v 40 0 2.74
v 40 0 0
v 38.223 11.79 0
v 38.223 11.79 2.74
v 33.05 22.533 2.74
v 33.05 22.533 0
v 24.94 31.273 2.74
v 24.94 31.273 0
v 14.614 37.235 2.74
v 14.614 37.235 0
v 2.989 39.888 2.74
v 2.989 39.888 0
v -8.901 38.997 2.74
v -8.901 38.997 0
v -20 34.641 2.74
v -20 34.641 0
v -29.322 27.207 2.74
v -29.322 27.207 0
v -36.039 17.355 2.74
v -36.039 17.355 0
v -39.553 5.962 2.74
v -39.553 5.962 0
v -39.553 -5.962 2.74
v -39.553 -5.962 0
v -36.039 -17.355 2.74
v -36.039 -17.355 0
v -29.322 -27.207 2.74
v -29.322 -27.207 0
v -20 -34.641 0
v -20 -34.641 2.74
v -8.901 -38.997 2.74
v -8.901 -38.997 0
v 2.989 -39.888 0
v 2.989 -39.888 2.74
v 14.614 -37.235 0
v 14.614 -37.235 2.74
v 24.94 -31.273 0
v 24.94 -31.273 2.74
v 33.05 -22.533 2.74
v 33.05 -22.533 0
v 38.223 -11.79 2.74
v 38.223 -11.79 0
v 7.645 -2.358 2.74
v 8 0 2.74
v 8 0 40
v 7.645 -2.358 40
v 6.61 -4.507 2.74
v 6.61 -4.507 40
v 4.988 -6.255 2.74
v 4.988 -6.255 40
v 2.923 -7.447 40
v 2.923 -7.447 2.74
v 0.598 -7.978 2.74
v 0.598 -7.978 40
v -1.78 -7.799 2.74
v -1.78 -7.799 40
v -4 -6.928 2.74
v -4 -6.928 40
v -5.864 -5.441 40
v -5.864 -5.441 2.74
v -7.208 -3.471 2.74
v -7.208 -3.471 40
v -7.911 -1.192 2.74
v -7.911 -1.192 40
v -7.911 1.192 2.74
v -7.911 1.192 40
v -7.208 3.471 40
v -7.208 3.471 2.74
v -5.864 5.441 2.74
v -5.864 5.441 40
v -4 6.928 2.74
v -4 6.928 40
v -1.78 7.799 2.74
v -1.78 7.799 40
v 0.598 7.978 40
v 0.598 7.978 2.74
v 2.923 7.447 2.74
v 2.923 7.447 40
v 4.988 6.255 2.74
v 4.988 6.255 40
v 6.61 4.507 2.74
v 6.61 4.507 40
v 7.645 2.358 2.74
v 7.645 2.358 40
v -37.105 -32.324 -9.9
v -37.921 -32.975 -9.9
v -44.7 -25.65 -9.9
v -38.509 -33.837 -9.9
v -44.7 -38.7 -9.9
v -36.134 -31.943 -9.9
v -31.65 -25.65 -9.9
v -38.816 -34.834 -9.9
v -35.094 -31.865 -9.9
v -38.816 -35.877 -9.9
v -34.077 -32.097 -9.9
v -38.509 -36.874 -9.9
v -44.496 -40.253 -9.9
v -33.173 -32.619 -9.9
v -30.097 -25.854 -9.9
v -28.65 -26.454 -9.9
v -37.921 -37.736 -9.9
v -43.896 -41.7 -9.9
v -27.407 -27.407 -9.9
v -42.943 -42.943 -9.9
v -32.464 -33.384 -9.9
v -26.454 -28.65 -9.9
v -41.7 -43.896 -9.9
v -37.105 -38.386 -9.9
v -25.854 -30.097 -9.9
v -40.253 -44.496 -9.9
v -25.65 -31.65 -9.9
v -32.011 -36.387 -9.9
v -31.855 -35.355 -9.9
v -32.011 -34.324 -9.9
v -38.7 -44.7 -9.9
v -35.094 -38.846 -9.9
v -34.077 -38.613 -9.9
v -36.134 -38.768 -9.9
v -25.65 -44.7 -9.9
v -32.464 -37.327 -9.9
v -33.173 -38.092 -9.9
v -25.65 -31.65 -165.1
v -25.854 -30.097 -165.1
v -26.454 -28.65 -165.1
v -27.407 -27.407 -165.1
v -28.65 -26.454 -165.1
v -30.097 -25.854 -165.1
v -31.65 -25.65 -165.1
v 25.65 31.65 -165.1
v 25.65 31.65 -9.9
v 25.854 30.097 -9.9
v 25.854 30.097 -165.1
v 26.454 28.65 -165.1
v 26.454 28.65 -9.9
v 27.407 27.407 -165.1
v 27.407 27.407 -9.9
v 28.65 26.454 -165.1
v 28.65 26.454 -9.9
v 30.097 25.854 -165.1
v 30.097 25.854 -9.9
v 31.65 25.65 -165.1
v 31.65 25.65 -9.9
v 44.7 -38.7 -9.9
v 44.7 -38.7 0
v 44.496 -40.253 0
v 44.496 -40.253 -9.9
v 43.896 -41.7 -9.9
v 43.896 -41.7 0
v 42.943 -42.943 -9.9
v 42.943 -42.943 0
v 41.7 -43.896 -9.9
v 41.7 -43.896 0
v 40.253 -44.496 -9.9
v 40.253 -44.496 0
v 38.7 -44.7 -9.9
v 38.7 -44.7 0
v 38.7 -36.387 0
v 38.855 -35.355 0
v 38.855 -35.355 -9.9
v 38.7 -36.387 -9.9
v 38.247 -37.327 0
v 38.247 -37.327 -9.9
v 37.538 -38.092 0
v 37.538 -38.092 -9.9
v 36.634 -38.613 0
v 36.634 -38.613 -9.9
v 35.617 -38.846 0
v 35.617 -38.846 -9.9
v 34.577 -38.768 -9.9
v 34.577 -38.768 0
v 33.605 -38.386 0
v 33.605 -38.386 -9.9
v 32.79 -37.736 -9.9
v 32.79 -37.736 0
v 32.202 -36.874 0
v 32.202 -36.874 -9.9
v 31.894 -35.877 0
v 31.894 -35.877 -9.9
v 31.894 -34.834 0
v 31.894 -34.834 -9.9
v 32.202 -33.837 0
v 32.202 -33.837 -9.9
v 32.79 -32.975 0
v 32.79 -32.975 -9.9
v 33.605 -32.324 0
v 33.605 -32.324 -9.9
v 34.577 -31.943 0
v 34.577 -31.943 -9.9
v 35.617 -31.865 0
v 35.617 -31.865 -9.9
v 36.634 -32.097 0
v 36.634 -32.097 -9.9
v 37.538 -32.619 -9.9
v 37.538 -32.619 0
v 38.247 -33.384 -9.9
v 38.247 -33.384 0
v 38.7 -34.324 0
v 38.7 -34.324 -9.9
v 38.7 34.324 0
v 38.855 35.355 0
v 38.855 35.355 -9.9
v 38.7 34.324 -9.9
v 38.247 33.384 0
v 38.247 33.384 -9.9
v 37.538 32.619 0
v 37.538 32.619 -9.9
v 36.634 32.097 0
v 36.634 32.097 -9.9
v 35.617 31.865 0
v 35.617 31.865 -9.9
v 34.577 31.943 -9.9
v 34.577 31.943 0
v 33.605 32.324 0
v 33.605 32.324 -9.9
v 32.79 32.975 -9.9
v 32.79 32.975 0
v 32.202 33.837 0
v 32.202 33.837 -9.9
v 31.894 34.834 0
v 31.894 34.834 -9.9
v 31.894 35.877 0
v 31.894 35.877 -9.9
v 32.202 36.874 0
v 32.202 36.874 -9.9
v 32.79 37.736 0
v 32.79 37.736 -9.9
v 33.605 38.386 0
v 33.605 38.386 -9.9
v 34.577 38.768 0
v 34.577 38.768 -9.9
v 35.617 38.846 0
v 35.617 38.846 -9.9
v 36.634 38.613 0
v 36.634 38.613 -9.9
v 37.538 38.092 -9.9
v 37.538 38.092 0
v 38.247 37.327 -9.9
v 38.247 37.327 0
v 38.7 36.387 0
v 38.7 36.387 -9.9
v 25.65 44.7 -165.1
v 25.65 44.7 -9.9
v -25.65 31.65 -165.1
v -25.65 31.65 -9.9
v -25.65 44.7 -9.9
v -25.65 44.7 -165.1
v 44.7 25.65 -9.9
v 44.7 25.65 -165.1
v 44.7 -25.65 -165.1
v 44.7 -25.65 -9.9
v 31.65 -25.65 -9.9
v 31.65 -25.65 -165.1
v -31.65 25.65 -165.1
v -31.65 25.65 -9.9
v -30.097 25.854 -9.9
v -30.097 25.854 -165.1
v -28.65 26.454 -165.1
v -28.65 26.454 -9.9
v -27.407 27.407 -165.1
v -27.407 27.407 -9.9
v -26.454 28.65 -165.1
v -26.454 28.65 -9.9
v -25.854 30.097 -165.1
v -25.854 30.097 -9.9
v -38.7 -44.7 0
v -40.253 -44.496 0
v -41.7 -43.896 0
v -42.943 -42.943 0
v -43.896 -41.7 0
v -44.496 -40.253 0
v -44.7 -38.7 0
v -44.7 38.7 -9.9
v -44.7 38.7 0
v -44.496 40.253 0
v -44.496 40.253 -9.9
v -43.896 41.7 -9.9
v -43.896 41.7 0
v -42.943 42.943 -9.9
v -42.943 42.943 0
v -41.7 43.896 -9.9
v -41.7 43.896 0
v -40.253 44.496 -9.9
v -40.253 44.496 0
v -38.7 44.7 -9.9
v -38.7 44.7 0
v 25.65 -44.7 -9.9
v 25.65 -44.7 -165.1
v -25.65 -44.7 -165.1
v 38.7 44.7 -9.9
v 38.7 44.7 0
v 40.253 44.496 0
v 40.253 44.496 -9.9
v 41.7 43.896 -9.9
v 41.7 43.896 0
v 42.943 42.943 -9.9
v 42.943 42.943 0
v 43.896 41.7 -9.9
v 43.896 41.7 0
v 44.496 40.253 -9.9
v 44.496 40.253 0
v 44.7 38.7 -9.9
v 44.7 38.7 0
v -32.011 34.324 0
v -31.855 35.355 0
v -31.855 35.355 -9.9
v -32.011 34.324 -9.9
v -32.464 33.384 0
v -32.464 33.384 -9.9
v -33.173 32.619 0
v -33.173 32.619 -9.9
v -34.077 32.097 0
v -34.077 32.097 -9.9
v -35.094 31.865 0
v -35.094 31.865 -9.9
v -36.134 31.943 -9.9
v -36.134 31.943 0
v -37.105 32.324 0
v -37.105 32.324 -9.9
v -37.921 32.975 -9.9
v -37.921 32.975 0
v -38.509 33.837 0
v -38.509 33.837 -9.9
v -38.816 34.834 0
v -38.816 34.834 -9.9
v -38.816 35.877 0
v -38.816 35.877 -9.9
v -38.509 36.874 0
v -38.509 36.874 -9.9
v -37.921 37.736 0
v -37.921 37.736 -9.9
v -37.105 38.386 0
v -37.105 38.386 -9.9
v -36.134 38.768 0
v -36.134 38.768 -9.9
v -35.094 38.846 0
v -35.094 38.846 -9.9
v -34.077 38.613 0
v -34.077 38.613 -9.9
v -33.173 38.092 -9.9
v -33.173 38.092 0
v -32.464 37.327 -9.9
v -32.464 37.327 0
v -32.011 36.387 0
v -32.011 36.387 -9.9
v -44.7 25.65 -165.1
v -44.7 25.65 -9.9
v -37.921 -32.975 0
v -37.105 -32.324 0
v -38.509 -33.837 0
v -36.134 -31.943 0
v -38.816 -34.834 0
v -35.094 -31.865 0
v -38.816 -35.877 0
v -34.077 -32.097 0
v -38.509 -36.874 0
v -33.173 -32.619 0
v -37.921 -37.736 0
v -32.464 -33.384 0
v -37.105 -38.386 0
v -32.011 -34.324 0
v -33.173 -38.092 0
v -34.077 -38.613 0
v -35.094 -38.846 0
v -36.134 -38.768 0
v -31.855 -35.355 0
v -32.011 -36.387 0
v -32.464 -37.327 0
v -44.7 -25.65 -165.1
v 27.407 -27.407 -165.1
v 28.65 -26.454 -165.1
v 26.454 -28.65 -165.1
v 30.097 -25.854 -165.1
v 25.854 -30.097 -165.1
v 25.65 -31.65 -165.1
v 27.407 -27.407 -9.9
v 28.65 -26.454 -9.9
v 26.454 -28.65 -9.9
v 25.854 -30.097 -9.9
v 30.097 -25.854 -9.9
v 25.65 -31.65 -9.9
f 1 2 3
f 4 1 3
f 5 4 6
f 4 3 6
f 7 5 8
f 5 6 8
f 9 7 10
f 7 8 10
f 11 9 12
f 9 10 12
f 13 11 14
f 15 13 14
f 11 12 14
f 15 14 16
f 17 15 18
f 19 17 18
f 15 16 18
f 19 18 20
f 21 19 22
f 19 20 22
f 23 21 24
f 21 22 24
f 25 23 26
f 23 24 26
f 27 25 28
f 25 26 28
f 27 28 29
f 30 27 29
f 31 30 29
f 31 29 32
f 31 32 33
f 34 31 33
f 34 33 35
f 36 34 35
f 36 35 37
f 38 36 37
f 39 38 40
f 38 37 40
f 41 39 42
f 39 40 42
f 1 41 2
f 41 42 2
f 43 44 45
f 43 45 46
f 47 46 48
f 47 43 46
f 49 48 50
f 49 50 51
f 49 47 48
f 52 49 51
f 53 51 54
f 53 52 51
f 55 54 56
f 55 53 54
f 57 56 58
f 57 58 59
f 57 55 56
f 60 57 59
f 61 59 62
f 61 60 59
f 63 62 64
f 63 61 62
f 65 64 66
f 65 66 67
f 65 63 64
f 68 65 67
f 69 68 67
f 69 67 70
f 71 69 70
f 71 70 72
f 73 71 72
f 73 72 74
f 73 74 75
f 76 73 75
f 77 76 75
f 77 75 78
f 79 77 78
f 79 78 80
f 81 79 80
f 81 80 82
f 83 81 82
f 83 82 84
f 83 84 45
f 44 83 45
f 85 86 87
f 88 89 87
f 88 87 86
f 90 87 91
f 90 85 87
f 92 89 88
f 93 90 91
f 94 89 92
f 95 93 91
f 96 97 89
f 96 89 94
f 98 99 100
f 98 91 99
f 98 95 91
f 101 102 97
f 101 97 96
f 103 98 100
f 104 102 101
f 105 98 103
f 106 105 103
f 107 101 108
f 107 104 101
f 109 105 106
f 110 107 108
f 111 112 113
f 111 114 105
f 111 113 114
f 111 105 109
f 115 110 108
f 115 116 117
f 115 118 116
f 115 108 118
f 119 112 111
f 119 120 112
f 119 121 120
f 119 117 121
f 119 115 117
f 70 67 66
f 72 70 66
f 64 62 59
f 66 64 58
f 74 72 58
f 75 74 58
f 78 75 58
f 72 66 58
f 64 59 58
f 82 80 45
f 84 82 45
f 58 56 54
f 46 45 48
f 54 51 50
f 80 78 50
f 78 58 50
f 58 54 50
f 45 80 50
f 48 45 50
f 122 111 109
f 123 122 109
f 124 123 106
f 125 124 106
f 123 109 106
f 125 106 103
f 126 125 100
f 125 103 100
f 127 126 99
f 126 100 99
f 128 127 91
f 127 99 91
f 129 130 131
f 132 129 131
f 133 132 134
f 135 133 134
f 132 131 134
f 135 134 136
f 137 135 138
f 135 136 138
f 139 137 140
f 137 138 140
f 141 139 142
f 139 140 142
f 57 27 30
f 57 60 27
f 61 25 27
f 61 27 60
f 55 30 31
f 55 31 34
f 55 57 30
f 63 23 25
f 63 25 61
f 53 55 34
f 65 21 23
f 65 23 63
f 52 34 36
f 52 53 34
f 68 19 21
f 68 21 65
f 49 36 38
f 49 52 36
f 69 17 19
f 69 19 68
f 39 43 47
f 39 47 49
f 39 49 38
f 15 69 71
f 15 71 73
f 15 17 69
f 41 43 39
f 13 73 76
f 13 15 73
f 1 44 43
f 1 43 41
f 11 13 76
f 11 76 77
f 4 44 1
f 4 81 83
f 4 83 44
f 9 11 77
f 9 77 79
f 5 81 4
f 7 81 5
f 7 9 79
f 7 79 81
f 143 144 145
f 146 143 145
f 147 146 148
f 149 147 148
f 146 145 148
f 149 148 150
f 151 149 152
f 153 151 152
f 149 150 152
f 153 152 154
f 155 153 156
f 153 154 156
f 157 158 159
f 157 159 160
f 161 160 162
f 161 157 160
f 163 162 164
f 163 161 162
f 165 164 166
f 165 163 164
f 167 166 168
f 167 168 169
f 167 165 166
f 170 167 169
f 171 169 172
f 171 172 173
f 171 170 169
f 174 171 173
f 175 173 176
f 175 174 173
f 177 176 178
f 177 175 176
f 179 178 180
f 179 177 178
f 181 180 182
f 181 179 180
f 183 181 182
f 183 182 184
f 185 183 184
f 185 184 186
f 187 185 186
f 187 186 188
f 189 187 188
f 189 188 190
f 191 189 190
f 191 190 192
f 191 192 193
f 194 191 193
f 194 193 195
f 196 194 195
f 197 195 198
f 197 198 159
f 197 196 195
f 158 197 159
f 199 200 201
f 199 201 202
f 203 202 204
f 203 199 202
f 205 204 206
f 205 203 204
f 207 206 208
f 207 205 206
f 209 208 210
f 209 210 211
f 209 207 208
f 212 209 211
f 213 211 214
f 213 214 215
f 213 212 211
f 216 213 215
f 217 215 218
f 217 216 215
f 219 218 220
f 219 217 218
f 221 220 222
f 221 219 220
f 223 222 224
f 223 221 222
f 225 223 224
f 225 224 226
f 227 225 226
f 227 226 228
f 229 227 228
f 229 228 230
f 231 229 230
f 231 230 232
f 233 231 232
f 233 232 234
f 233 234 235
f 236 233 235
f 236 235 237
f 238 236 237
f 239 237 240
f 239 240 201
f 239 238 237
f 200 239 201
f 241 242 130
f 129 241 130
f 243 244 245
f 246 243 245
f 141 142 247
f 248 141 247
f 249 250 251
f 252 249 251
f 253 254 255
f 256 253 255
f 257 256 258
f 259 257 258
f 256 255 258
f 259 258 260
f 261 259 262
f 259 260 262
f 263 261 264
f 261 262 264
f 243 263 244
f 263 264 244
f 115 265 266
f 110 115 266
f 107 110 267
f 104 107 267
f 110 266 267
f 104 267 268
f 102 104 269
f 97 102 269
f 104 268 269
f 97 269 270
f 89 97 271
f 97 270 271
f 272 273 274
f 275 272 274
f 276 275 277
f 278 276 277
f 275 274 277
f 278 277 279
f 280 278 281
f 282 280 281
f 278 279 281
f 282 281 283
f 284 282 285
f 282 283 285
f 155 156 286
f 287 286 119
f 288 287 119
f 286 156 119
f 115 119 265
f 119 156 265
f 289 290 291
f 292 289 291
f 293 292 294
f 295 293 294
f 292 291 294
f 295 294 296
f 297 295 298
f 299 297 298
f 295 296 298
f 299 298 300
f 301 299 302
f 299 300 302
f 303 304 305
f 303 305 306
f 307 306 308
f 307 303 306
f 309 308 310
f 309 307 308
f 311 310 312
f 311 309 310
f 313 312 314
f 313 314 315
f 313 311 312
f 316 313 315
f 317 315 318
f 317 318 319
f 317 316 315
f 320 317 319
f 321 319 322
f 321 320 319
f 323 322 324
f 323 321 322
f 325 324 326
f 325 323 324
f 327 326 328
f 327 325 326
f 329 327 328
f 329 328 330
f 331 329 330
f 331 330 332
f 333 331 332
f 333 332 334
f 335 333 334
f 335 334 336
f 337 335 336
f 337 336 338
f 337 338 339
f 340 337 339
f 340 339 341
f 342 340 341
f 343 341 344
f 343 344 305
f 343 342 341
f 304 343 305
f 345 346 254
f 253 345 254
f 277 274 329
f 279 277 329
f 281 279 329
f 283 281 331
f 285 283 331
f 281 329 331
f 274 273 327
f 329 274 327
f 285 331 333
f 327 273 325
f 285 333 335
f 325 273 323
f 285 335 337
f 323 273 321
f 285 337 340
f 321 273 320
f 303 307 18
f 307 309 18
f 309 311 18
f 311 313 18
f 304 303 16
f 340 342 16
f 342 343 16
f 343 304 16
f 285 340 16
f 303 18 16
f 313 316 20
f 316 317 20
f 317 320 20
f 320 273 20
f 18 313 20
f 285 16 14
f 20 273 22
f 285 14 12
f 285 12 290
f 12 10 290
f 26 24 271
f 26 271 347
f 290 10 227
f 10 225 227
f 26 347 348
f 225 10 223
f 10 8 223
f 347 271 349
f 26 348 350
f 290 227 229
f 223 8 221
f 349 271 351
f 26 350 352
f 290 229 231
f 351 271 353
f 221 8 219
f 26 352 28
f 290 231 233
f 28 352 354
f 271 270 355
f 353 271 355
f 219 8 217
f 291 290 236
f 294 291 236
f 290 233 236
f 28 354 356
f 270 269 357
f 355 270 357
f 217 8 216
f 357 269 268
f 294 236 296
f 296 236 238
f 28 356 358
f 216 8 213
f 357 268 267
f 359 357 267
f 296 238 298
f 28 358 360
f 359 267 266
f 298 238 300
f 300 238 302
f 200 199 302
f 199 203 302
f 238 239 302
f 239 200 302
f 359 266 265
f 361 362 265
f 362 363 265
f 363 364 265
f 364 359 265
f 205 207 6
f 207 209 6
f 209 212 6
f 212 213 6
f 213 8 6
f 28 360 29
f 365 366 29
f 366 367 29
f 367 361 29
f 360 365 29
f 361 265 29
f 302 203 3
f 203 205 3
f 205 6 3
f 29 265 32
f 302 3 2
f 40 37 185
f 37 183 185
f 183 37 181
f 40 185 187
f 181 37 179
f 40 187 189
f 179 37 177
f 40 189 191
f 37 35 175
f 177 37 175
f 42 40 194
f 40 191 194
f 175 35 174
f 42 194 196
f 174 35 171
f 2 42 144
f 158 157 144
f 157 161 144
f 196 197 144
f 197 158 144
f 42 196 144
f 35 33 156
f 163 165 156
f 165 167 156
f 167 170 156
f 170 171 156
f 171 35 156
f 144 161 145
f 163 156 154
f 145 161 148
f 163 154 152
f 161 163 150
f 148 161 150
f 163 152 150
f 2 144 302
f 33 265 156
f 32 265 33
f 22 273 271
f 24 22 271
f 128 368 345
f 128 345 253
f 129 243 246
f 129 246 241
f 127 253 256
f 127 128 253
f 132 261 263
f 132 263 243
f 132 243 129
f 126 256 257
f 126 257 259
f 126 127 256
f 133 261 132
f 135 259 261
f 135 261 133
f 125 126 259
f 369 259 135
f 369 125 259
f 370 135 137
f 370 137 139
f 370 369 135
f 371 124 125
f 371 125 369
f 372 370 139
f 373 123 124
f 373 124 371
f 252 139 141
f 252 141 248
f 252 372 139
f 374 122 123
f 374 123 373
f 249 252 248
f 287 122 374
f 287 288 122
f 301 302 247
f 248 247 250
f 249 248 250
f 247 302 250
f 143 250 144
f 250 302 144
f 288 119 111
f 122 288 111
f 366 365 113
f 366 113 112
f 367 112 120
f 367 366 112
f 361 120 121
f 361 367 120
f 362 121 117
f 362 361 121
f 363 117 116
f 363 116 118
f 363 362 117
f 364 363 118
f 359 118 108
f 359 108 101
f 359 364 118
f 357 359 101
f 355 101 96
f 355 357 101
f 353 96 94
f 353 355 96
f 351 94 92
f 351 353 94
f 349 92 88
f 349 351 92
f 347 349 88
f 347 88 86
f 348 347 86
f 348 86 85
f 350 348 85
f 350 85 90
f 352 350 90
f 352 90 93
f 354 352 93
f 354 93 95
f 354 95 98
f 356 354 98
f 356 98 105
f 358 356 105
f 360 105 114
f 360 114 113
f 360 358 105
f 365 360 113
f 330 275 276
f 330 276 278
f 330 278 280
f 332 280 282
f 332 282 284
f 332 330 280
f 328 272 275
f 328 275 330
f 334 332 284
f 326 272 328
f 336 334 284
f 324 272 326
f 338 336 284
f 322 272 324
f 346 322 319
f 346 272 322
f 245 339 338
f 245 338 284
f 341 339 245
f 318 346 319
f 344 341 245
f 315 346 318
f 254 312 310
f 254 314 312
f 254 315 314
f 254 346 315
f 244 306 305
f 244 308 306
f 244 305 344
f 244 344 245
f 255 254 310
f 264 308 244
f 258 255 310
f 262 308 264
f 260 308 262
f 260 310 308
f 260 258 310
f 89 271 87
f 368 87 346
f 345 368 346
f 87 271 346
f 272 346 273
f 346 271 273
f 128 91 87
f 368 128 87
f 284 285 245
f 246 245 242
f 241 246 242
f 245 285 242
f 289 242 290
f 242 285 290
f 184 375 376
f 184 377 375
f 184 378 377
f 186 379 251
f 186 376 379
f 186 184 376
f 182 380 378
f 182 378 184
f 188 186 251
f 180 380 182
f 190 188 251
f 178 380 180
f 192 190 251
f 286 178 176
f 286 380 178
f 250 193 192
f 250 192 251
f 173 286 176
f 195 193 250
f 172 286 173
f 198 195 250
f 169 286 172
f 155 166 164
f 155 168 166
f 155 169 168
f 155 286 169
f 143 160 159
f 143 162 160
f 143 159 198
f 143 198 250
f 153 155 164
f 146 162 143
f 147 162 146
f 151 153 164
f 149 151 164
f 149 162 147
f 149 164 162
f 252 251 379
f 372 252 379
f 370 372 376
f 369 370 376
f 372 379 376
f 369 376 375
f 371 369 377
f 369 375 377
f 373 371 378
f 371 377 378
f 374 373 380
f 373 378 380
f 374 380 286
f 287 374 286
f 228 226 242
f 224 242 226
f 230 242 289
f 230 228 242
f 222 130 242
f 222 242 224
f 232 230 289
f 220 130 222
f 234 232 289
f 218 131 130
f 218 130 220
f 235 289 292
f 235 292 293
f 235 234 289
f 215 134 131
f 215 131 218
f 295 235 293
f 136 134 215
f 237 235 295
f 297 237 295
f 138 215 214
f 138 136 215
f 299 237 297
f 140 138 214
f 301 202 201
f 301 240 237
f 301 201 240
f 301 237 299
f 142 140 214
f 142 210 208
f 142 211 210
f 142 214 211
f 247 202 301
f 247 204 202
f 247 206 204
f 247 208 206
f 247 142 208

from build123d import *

# Parameters (mm, degrees)
F0_R     = 40
F1_DEPTH = 2.74
F2_R     = 8
F3_DEPTH = 40
F4_R     = 3.5
F5_DEPTH = 9.9
F7_DEPTH = 155.2


with BuildPart() as f1:
    # F0 (on Top) → F1 (new body)
    with BuildSketch(Plane.XY):
        Circle(F0_R)
    extrude(amount=F1_DEPTH)

    # F2 (on face) → F3 (join)
    with BuildSketch(Plane(origin=(0, 0, 0), x_dir=(1, 0, 0), z_dir=(0, 0, -1))):
        Circle(F2_R)
    extrude(amount=-F3_DEPTH)

    # F4 (on face) → F5 (join)
    with BuildSketch(Plane(origin=(0, 0, 0), x_dir=(1, 0, 0), z_dir=(0, 0, -1))):
        with BuildLine():
            Line((-38.7, -44.7), (38.7, -44.7))
            ThreePointArc((38.7, -44.7), (42.942641, -42.942641), (44.7, -38.7))
            Line((44.7, -38.7), (44.7, 38.7))
            ThreePointArc((44.7, 38.7), (42.942641, 42.942641), (38.7, 44.7))
            Line((38.7, 44.7), (-38.7, 44.7))
            ThreePointArc((-38.7, 44.7), (-42.942641, 42.942641), (-44.7, 38.7))
            Line((-44.7, 38.7), (-44.7, -38.7))
            ThreePointArc((-44.7, -38.7), (-42.942641, -42.942641), (-38.7, -44.7))
        make_face()
        with Locations((-35.355339, -35.355339)):
            Circle(F4_R, mode=Mode.SUBTRACT)
        with Locations((35.355339, -35.355339)):
            Circle(F4_R, mode=Mode.SUBTRACT)
        with Locations((-35.355339, 35.355339)):
            Circle(F4_R, mode=Mode.SUBTRACT)
        with Locations((35.355339, 35.355339)):
            Circle(F4_R, mode=Mode.SUBTRACT)
    extrude(amount=F5_DEPTH)

    # F6 (on face) → F7 (join)
    with BuildSketch(Plane(origin=(0, 0, -9.9), x_dir=(1, 0, 0), z_dir=(0, 0, -1))):
        with BuildLine():
            Line((44.7, 0), (44.7, 25.65))
            Line((44.7, 25.65), (31.65, 25.65))
            ThreePointArc((31.65, 25.65), (27.407359, 27.407359), (25.65, 31.65))
            Line((25.65, 31.65), (25.65, 44.7))
            Line((25.65, 44.7), (0, 44.7))
            Line((0, 44.7), (0, 0))
            Line((0, 0), (44.7, 0))
        make_face()
        with BuildLine():
            Line((44.7, -25.65), (44.7, 0))
            Line((44.7, 0), (0, 0))
            Line((0, 0), (0, -44.7))
            Line((0, -44.7), (25.65, -44.7))
            Line((25.65, -44.7), (25.65, -31.65))
            ThreePointArc((25.65, -31.65), (27.407359, -27.407359), (31.65, -25.65))
            Line((31.65, -25.65), (44.7, -25.65))
        make_face()
        with BuildLine():
            Line((-44.7, 0), (0, 0))
            Line((0, 0), (0, 44.7))
            Line((0, 44.7), (-25.65, 44.7))
            Line((-25.65, 44.7), (-25.65, 31.65))
            ThreePointArc((-25.65, 31.65), (-27.407359, 27.407359), (-31.65, 25.65))
            Line((-31.65, 25.65), (-44.7, 25.65))
            Line((-44.7, 25.65), (-44.7, 0))
        make_face()
        with BuildLine():
            Line((0, -44.7), (0, 0))
            Line((0, 0), (-44.7, 0))
            Line((-44.7, 0), (-44.7, -25.65))
            Line((-44.7, -25.65), (-31.65, -25.65))
            ThreePointArc((-31.65, -25.65), (-27.407359, -27.407359), (-25.65, -31.65))
            Line((-25.65, -31.65), (-25.65, -44.7))
            Line((-25.65, -44.7), (0, -44.7))
        make_face()
    extrude(amount=F7_DEPTH)


solid = f1.part
